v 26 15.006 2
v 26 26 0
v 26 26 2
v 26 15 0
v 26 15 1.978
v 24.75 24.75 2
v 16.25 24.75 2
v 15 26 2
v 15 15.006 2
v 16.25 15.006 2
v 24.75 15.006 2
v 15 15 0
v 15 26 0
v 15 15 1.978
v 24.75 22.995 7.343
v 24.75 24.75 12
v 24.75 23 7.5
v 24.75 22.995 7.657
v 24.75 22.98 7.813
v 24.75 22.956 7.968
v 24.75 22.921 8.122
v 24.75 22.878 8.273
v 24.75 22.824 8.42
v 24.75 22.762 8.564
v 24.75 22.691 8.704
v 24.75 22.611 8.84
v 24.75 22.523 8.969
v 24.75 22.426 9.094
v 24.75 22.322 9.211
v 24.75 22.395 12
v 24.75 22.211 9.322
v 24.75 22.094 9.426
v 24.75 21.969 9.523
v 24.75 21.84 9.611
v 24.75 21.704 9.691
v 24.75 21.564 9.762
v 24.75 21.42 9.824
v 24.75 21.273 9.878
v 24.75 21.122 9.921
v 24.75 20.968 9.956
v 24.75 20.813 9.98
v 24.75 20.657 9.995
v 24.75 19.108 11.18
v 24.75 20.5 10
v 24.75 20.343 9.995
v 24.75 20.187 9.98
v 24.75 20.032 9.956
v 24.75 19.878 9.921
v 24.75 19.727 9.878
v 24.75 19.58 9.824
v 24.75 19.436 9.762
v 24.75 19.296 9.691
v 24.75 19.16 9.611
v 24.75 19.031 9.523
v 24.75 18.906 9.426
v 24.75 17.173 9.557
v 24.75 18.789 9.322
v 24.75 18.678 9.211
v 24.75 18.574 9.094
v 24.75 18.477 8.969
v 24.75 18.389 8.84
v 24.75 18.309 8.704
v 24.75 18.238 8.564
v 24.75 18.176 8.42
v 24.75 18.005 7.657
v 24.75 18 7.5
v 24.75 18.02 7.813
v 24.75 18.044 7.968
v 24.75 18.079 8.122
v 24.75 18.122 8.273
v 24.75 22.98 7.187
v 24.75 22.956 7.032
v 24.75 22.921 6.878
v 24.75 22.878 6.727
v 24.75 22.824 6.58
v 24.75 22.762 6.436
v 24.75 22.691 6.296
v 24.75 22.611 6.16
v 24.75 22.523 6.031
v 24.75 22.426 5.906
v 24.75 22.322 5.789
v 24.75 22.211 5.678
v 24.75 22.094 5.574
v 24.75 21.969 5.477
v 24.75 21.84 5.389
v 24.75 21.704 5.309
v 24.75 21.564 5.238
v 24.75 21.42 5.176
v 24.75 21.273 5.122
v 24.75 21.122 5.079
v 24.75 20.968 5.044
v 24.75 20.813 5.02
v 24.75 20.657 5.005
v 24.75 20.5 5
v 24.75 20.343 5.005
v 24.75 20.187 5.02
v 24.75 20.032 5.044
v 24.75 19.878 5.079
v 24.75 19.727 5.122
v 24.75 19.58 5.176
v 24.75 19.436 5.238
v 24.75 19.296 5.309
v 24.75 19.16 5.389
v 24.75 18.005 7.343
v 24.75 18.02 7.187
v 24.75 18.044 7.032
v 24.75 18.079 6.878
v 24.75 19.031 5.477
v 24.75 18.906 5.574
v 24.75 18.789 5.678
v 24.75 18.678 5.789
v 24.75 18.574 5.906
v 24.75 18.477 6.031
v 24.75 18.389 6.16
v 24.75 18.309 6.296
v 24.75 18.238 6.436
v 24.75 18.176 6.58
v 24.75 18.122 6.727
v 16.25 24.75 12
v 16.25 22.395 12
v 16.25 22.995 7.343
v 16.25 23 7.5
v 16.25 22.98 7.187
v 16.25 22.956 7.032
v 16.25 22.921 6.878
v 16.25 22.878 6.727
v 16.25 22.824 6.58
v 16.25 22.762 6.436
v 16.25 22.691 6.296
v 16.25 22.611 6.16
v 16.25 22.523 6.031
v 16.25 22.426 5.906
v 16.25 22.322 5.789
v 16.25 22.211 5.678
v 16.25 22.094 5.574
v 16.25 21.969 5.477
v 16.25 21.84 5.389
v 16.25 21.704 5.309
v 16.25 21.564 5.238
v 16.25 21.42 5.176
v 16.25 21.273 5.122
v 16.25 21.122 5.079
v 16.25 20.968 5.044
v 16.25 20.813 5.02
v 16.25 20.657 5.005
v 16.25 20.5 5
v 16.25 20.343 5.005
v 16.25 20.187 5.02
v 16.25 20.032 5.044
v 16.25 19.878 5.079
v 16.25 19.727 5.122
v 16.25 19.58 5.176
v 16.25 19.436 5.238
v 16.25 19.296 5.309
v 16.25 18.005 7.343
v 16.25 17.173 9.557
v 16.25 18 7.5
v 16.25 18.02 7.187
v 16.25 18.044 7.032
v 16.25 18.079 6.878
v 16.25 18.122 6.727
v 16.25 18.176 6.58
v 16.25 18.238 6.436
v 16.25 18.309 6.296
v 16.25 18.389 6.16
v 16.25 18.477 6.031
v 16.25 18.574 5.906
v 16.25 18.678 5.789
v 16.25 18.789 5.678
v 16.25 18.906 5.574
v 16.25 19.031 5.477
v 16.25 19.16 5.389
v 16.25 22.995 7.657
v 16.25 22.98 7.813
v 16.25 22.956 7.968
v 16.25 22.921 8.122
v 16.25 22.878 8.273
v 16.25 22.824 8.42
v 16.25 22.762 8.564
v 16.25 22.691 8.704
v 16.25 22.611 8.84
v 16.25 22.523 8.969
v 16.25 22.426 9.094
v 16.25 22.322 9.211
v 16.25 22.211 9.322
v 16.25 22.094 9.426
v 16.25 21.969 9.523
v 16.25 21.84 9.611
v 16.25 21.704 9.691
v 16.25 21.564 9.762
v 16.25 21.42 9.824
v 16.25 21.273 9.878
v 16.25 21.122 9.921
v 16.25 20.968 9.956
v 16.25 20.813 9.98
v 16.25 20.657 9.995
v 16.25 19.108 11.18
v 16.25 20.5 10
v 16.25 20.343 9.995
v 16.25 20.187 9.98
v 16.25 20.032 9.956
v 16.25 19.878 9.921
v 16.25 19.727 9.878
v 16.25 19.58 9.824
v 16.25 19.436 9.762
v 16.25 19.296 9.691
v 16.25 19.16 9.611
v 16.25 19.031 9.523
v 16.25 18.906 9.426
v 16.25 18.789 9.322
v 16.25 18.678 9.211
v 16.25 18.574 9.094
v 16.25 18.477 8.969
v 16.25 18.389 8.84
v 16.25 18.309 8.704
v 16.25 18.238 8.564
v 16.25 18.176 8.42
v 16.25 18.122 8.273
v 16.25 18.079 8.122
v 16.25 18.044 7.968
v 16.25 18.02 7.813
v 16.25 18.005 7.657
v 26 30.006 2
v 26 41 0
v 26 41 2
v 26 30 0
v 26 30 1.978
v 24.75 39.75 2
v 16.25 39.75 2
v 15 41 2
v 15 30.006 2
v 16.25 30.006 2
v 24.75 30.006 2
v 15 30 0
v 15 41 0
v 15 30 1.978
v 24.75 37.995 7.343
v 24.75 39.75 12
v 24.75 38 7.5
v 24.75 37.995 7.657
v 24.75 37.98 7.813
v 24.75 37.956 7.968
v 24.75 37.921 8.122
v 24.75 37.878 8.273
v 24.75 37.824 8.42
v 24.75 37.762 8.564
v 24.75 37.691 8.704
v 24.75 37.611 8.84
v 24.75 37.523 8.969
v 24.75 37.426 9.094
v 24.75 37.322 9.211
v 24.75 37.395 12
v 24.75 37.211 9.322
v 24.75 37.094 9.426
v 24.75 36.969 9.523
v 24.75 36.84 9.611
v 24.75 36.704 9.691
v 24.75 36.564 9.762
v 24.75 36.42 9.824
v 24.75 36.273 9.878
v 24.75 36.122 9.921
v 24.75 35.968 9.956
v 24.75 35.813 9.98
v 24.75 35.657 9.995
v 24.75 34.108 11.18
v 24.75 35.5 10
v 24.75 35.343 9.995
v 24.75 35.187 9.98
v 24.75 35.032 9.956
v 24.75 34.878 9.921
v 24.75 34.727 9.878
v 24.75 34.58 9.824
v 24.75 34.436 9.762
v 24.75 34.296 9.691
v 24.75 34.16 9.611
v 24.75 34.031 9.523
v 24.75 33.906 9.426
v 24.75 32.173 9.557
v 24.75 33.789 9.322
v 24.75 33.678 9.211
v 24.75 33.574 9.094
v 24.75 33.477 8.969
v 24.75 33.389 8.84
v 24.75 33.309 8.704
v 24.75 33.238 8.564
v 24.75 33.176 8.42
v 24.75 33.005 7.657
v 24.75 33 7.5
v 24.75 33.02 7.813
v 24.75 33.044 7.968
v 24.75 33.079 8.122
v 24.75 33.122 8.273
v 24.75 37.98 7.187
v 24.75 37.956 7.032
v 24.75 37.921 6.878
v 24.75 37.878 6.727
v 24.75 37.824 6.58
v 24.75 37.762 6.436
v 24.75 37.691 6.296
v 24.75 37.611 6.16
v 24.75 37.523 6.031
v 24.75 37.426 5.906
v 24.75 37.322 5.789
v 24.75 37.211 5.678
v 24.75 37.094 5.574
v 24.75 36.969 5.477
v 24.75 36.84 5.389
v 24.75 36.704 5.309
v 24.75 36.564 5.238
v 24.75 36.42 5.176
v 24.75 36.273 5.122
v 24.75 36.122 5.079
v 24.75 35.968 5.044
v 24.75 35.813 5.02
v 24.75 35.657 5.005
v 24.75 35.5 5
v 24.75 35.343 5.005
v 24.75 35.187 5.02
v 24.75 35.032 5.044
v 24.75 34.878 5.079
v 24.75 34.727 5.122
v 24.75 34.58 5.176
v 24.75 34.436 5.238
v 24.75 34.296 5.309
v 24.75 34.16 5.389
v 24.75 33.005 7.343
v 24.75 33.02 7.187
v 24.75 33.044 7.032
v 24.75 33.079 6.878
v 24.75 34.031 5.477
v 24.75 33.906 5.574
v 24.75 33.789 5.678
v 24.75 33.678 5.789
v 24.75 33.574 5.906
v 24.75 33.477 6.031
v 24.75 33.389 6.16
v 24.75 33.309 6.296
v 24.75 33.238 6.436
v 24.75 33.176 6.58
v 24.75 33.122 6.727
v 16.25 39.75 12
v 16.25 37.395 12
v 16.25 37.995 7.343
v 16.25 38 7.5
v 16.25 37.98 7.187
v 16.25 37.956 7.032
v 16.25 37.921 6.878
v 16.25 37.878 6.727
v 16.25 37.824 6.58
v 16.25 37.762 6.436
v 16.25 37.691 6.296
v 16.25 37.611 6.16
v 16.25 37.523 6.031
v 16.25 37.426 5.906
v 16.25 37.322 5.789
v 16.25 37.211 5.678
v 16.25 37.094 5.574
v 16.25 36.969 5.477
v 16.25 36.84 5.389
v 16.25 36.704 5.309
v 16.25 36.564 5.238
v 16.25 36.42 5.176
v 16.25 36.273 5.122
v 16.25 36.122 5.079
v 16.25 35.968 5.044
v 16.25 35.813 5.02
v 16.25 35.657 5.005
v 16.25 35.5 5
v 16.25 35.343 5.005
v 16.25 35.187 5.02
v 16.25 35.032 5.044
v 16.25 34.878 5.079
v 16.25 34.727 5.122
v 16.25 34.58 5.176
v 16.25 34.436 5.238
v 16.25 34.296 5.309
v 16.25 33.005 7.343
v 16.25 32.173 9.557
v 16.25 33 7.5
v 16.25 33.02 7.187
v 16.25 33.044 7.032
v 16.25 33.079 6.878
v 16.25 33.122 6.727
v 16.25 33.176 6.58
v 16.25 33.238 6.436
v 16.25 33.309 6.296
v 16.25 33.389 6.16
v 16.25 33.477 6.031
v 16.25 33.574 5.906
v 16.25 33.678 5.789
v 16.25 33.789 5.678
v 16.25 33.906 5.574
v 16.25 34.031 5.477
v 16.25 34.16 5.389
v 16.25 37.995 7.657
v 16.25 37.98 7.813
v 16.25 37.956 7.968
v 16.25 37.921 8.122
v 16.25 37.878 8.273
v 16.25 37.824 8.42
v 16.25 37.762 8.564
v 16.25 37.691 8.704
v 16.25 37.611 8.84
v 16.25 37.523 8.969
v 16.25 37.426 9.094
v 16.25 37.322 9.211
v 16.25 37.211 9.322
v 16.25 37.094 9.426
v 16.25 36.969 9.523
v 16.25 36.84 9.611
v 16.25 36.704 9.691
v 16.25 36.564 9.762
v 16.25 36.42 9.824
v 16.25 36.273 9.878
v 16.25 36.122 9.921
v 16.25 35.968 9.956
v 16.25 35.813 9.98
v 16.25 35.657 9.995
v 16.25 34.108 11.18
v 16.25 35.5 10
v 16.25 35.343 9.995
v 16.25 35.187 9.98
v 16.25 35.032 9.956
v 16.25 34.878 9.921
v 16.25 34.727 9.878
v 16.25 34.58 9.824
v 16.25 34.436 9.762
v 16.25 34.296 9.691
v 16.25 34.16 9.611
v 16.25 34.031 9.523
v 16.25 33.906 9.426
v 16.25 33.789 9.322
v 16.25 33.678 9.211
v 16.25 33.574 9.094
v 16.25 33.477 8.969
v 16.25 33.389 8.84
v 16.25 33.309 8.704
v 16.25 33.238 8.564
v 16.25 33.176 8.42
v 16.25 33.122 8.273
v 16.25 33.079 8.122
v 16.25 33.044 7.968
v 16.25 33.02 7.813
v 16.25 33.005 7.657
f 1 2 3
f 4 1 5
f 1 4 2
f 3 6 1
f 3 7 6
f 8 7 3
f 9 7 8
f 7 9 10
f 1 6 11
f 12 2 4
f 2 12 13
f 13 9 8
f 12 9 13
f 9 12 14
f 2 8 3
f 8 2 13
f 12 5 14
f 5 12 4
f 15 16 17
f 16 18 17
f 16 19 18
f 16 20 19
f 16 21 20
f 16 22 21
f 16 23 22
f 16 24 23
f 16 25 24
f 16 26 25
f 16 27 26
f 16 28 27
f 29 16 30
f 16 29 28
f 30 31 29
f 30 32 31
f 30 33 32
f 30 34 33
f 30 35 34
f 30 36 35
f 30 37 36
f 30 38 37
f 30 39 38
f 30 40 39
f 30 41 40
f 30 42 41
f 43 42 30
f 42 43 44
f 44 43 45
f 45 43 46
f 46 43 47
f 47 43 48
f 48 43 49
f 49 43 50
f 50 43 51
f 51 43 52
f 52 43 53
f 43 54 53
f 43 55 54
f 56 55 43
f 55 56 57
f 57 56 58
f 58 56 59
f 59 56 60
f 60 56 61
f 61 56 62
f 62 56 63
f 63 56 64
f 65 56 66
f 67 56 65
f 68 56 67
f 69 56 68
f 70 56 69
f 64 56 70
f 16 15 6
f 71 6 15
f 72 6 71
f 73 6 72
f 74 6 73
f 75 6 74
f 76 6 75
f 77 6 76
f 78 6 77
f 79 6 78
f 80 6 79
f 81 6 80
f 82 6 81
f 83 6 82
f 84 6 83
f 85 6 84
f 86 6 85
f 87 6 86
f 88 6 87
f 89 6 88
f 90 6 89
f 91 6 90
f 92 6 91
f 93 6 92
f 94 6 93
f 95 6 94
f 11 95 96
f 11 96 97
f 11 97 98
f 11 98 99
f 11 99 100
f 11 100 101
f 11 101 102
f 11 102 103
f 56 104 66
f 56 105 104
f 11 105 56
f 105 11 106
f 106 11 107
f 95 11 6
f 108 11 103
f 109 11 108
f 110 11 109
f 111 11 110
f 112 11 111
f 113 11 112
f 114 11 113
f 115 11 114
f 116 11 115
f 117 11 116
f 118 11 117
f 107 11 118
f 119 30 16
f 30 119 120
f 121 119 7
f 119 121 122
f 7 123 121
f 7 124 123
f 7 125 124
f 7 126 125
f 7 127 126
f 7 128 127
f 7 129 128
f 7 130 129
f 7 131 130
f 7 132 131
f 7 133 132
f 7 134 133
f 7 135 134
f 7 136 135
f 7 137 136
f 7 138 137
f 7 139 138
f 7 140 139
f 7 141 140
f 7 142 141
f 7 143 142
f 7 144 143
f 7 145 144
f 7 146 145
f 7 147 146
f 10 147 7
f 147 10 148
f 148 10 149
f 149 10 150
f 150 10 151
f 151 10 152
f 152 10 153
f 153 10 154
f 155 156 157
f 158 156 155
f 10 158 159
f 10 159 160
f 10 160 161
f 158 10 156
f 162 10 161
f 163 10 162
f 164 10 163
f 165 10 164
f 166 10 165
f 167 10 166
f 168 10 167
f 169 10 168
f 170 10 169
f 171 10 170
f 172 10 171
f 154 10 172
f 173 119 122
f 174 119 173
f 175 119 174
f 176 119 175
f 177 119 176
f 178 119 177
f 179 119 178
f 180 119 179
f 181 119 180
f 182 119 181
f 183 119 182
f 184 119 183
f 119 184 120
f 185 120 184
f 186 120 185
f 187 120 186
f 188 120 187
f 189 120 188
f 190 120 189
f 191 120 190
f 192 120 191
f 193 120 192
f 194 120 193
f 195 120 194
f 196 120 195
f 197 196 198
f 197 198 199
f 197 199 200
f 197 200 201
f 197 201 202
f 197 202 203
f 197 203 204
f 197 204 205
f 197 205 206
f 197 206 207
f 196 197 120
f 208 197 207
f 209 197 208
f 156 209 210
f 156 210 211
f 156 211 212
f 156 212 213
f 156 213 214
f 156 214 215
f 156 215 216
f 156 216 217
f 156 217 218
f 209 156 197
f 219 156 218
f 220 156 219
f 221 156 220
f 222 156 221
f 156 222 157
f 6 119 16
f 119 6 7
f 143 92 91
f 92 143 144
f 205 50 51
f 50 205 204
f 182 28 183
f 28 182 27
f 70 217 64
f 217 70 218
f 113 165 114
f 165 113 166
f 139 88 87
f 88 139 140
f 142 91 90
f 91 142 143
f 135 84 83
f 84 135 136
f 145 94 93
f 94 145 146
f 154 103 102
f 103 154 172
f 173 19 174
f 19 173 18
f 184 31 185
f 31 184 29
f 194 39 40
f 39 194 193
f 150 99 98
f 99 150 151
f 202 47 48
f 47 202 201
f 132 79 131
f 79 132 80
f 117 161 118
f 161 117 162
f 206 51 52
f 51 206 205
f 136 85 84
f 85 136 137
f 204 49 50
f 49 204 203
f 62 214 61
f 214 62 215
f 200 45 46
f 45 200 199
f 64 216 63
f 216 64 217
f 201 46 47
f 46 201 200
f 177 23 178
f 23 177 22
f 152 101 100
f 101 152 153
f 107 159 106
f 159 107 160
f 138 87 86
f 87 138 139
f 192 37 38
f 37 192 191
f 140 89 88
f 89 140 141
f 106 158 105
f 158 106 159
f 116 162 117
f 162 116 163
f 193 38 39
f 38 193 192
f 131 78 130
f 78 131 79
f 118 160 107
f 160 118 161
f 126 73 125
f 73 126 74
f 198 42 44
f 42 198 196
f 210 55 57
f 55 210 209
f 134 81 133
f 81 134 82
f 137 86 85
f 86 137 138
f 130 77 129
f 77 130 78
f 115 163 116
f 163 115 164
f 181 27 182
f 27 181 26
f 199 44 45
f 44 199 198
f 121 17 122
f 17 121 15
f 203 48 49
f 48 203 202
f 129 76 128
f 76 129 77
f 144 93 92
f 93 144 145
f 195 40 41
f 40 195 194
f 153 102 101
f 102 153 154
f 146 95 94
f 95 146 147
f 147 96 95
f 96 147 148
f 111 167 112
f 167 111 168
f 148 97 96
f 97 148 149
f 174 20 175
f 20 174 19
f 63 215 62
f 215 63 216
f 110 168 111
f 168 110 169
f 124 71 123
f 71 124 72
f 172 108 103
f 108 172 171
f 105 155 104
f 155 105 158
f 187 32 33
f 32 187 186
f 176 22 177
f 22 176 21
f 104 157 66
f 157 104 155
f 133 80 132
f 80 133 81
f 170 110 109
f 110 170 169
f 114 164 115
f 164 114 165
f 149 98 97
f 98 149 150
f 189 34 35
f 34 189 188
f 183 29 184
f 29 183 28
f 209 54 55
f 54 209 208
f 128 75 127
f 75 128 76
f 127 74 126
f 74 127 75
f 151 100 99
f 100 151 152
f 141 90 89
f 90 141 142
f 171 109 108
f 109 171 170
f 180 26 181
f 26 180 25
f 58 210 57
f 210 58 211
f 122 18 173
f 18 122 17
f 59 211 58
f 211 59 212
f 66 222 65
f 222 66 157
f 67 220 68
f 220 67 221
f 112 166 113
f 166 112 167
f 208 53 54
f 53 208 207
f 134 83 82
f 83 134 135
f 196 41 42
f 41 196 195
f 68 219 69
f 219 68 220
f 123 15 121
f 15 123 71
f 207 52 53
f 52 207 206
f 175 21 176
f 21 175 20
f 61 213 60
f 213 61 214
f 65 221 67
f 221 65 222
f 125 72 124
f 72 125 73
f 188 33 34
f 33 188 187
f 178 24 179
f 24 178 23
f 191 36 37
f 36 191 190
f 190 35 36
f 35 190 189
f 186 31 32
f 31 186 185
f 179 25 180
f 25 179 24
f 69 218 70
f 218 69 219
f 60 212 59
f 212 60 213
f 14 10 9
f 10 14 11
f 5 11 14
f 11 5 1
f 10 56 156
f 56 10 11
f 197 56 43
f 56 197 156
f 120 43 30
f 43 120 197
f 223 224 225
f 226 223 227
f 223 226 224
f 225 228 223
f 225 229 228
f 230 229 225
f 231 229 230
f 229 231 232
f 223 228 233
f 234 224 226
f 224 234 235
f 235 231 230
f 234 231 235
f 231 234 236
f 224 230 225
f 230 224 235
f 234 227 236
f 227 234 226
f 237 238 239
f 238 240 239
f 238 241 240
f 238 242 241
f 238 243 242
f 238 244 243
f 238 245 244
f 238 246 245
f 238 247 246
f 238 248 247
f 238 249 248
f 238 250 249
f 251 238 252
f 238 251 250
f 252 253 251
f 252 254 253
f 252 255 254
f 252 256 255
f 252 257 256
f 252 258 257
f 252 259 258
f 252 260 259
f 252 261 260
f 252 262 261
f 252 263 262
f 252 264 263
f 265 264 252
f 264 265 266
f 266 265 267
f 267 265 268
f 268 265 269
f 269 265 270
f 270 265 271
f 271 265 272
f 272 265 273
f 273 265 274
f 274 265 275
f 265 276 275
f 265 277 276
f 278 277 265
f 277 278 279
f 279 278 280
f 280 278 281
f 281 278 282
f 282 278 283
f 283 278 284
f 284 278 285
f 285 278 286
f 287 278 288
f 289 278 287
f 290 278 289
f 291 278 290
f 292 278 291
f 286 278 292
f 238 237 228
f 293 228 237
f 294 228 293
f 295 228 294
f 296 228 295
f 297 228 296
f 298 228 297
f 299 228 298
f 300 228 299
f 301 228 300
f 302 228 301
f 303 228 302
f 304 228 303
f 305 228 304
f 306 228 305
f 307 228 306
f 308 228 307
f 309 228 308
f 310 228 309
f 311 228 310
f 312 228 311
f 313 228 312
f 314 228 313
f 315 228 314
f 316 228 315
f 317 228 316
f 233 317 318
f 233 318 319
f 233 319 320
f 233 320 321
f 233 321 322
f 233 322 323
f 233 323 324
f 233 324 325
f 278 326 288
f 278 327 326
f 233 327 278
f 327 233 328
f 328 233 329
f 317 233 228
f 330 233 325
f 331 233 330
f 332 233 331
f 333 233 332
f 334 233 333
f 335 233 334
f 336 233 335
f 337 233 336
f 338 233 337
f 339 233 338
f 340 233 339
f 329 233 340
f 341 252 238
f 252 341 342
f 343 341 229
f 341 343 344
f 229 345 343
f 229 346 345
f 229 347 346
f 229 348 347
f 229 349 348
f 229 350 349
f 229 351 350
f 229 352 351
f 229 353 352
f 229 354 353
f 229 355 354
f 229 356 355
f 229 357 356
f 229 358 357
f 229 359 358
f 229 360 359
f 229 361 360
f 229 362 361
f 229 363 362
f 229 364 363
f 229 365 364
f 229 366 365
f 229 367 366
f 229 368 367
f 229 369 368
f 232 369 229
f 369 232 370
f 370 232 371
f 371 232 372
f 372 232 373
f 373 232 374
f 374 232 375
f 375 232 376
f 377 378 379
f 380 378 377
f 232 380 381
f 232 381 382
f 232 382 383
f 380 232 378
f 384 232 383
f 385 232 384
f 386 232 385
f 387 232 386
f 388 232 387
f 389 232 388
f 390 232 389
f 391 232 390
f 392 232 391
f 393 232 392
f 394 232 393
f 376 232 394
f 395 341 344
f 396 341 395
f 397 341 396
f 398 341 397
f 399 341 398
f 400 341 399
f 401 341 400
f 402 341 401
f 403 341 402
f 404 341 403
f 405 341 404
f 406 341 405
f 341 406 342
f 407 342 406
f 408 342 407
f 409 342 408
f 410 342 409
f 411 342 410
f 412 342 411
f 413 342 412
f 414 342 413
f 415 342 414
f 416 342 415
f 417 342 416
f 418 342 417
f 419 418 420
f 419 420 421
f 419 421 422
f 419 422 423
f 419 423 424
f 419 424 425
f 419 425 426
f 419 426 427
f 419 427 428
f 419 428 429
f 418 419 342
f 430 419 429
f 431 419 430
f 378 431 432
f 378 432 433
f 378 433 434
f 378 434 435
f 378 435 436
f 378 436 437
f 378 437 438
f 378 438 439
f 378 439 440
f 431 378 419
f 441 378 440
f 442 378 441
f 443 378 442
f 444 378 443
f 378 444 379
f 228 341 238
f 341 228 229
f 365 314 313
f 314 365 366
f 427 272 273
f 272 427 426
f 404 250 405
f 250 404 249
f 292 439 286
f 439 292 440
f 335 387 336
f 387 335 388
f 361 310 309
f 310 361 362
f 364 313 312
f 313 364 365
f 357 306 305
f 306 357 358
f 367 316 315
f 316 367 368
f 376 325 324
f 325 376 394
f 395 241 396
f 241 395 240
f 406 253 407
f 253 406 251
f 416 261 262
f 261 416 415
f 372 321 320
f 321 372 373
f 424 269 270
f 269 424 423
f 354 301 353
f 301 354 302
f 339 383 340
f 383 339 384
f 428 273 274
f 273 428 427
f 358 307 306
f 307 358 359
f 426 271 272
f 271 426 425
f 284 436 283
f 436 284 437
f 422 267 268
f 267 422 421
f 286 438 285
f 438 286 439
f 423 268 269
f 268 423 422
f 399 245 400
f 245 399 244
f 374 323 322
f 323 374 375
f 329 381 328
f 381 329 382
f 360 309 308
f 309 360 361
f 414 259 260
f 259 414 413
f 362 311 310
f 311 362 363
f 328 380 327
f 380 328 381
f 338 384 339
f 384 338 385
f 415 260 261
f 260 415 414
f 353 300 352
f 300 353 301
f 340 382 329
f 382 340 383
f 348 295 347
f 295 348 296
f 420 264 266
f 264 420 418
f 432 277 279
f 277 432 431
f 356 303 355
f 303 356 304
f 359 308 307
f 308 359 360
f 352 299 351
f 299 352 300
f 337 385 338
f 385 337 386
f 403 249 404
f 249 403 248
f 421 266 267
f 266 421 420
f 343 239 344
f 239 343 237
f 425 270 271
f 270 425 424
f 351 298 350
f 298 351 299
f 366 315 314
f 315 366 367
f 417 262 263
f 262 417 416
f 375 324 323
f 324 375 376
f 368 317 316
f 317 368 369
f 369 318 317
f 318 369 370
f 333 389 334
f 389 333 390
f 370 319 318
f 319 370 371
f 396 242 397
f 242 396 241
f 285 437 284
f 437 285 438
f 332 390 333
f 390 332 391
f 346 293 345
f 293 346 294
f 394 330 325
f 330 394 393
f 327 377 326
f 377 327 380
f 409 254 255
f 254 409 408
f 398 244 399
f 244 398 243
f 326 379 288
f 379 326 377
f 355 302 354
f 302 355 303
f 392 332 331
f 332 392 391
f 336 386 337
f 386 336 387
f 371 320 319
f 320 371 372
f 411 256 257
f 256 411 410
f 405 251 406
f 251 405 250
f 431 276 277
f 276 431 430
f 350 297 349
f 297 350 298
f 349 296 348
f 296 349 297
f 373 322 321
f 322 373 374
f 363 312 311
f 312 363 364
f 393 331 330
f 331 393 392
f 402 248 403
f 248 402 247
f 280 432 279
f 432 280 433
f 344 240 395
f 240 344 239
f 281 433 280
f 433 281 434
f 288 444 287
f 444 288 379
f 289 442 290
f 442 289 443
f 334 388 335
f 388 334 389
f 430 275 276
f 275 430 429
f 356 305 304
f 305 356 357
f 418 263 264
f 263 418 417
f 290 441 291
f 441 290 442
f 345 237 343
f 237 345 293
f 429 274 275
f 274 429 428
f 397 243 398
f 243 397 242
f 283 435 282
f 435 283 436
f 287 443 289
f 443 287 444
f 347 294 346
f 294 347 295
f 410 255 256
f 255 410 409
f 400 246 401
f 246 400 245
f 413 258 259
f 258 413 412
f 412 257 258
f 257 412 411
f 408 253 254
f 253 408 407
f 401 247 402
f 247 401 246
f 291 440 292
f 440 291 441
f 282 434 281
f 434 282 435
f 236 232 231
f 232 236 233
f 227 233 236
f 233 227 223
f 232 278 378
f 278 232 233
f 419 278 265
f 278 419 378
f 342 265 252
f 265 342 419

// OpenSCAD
// Заглушки для советской лампы:

$fn = 100; // Разрешение поверхности.

// Обычная заглушка:
module stuff() {
    difference() {
        union() {
            cube([11, 11,  2]);
            translate([1.25, 1.25, 0]) {
                cube([ 8.5,  8.5, 12]);
            }
        }
        translate([-2, 5.5, 7.5]) {
            rotate([0, 90, 0]) {
                cylinder(h = 15, r = 2.5);
            }
        }
    }
}

// Заглушка для проброса провода:
module stuffWire() {
    difference() {
        union() {
            cube([11, 11,  2]);
            translate([1.25, 0, 0]) {
                cube([ 8.5,  9.75, 12]);
            }
        }
        translate([-2, 5.5, 7.5]) {
            rotate([0, 90, 0]) {
                cylinder(h = 15, r = 2.5);
            }
        }
        translate([-1, -3, 2.4]) {
            rotate([-16, 0, 0]) {
                cube([15, 3, 15]);
            }
        }
        translate([-1, -2.8, 9.3]) {
            rotate([-50, 0, 0]) {
                cube([15, 3, 15]);
            }
        }
        translate([-1, -3, 12.5]) {
            rotate([-76, 0, 0]) {
                cube([15, 3, 15]);
            }
        }
    }
}

// Все детали:
//translate([ 0,  0,  0]) { stuff(); }
//translate([ 0, 15,  0]) { stuff(); }
//translate([ 0, 30,  0]) { stuff(); }
//translate([15,  0,  0]) { stuff(); }

translate([15, 15,  0]) { stuffWire(); }
translate([15, 30,  0]) { stuffWire(); }
//translate([30,  0,  0]) { stuffWire(); }
//translate([30, 15,  0]) { stuffWire(); }
